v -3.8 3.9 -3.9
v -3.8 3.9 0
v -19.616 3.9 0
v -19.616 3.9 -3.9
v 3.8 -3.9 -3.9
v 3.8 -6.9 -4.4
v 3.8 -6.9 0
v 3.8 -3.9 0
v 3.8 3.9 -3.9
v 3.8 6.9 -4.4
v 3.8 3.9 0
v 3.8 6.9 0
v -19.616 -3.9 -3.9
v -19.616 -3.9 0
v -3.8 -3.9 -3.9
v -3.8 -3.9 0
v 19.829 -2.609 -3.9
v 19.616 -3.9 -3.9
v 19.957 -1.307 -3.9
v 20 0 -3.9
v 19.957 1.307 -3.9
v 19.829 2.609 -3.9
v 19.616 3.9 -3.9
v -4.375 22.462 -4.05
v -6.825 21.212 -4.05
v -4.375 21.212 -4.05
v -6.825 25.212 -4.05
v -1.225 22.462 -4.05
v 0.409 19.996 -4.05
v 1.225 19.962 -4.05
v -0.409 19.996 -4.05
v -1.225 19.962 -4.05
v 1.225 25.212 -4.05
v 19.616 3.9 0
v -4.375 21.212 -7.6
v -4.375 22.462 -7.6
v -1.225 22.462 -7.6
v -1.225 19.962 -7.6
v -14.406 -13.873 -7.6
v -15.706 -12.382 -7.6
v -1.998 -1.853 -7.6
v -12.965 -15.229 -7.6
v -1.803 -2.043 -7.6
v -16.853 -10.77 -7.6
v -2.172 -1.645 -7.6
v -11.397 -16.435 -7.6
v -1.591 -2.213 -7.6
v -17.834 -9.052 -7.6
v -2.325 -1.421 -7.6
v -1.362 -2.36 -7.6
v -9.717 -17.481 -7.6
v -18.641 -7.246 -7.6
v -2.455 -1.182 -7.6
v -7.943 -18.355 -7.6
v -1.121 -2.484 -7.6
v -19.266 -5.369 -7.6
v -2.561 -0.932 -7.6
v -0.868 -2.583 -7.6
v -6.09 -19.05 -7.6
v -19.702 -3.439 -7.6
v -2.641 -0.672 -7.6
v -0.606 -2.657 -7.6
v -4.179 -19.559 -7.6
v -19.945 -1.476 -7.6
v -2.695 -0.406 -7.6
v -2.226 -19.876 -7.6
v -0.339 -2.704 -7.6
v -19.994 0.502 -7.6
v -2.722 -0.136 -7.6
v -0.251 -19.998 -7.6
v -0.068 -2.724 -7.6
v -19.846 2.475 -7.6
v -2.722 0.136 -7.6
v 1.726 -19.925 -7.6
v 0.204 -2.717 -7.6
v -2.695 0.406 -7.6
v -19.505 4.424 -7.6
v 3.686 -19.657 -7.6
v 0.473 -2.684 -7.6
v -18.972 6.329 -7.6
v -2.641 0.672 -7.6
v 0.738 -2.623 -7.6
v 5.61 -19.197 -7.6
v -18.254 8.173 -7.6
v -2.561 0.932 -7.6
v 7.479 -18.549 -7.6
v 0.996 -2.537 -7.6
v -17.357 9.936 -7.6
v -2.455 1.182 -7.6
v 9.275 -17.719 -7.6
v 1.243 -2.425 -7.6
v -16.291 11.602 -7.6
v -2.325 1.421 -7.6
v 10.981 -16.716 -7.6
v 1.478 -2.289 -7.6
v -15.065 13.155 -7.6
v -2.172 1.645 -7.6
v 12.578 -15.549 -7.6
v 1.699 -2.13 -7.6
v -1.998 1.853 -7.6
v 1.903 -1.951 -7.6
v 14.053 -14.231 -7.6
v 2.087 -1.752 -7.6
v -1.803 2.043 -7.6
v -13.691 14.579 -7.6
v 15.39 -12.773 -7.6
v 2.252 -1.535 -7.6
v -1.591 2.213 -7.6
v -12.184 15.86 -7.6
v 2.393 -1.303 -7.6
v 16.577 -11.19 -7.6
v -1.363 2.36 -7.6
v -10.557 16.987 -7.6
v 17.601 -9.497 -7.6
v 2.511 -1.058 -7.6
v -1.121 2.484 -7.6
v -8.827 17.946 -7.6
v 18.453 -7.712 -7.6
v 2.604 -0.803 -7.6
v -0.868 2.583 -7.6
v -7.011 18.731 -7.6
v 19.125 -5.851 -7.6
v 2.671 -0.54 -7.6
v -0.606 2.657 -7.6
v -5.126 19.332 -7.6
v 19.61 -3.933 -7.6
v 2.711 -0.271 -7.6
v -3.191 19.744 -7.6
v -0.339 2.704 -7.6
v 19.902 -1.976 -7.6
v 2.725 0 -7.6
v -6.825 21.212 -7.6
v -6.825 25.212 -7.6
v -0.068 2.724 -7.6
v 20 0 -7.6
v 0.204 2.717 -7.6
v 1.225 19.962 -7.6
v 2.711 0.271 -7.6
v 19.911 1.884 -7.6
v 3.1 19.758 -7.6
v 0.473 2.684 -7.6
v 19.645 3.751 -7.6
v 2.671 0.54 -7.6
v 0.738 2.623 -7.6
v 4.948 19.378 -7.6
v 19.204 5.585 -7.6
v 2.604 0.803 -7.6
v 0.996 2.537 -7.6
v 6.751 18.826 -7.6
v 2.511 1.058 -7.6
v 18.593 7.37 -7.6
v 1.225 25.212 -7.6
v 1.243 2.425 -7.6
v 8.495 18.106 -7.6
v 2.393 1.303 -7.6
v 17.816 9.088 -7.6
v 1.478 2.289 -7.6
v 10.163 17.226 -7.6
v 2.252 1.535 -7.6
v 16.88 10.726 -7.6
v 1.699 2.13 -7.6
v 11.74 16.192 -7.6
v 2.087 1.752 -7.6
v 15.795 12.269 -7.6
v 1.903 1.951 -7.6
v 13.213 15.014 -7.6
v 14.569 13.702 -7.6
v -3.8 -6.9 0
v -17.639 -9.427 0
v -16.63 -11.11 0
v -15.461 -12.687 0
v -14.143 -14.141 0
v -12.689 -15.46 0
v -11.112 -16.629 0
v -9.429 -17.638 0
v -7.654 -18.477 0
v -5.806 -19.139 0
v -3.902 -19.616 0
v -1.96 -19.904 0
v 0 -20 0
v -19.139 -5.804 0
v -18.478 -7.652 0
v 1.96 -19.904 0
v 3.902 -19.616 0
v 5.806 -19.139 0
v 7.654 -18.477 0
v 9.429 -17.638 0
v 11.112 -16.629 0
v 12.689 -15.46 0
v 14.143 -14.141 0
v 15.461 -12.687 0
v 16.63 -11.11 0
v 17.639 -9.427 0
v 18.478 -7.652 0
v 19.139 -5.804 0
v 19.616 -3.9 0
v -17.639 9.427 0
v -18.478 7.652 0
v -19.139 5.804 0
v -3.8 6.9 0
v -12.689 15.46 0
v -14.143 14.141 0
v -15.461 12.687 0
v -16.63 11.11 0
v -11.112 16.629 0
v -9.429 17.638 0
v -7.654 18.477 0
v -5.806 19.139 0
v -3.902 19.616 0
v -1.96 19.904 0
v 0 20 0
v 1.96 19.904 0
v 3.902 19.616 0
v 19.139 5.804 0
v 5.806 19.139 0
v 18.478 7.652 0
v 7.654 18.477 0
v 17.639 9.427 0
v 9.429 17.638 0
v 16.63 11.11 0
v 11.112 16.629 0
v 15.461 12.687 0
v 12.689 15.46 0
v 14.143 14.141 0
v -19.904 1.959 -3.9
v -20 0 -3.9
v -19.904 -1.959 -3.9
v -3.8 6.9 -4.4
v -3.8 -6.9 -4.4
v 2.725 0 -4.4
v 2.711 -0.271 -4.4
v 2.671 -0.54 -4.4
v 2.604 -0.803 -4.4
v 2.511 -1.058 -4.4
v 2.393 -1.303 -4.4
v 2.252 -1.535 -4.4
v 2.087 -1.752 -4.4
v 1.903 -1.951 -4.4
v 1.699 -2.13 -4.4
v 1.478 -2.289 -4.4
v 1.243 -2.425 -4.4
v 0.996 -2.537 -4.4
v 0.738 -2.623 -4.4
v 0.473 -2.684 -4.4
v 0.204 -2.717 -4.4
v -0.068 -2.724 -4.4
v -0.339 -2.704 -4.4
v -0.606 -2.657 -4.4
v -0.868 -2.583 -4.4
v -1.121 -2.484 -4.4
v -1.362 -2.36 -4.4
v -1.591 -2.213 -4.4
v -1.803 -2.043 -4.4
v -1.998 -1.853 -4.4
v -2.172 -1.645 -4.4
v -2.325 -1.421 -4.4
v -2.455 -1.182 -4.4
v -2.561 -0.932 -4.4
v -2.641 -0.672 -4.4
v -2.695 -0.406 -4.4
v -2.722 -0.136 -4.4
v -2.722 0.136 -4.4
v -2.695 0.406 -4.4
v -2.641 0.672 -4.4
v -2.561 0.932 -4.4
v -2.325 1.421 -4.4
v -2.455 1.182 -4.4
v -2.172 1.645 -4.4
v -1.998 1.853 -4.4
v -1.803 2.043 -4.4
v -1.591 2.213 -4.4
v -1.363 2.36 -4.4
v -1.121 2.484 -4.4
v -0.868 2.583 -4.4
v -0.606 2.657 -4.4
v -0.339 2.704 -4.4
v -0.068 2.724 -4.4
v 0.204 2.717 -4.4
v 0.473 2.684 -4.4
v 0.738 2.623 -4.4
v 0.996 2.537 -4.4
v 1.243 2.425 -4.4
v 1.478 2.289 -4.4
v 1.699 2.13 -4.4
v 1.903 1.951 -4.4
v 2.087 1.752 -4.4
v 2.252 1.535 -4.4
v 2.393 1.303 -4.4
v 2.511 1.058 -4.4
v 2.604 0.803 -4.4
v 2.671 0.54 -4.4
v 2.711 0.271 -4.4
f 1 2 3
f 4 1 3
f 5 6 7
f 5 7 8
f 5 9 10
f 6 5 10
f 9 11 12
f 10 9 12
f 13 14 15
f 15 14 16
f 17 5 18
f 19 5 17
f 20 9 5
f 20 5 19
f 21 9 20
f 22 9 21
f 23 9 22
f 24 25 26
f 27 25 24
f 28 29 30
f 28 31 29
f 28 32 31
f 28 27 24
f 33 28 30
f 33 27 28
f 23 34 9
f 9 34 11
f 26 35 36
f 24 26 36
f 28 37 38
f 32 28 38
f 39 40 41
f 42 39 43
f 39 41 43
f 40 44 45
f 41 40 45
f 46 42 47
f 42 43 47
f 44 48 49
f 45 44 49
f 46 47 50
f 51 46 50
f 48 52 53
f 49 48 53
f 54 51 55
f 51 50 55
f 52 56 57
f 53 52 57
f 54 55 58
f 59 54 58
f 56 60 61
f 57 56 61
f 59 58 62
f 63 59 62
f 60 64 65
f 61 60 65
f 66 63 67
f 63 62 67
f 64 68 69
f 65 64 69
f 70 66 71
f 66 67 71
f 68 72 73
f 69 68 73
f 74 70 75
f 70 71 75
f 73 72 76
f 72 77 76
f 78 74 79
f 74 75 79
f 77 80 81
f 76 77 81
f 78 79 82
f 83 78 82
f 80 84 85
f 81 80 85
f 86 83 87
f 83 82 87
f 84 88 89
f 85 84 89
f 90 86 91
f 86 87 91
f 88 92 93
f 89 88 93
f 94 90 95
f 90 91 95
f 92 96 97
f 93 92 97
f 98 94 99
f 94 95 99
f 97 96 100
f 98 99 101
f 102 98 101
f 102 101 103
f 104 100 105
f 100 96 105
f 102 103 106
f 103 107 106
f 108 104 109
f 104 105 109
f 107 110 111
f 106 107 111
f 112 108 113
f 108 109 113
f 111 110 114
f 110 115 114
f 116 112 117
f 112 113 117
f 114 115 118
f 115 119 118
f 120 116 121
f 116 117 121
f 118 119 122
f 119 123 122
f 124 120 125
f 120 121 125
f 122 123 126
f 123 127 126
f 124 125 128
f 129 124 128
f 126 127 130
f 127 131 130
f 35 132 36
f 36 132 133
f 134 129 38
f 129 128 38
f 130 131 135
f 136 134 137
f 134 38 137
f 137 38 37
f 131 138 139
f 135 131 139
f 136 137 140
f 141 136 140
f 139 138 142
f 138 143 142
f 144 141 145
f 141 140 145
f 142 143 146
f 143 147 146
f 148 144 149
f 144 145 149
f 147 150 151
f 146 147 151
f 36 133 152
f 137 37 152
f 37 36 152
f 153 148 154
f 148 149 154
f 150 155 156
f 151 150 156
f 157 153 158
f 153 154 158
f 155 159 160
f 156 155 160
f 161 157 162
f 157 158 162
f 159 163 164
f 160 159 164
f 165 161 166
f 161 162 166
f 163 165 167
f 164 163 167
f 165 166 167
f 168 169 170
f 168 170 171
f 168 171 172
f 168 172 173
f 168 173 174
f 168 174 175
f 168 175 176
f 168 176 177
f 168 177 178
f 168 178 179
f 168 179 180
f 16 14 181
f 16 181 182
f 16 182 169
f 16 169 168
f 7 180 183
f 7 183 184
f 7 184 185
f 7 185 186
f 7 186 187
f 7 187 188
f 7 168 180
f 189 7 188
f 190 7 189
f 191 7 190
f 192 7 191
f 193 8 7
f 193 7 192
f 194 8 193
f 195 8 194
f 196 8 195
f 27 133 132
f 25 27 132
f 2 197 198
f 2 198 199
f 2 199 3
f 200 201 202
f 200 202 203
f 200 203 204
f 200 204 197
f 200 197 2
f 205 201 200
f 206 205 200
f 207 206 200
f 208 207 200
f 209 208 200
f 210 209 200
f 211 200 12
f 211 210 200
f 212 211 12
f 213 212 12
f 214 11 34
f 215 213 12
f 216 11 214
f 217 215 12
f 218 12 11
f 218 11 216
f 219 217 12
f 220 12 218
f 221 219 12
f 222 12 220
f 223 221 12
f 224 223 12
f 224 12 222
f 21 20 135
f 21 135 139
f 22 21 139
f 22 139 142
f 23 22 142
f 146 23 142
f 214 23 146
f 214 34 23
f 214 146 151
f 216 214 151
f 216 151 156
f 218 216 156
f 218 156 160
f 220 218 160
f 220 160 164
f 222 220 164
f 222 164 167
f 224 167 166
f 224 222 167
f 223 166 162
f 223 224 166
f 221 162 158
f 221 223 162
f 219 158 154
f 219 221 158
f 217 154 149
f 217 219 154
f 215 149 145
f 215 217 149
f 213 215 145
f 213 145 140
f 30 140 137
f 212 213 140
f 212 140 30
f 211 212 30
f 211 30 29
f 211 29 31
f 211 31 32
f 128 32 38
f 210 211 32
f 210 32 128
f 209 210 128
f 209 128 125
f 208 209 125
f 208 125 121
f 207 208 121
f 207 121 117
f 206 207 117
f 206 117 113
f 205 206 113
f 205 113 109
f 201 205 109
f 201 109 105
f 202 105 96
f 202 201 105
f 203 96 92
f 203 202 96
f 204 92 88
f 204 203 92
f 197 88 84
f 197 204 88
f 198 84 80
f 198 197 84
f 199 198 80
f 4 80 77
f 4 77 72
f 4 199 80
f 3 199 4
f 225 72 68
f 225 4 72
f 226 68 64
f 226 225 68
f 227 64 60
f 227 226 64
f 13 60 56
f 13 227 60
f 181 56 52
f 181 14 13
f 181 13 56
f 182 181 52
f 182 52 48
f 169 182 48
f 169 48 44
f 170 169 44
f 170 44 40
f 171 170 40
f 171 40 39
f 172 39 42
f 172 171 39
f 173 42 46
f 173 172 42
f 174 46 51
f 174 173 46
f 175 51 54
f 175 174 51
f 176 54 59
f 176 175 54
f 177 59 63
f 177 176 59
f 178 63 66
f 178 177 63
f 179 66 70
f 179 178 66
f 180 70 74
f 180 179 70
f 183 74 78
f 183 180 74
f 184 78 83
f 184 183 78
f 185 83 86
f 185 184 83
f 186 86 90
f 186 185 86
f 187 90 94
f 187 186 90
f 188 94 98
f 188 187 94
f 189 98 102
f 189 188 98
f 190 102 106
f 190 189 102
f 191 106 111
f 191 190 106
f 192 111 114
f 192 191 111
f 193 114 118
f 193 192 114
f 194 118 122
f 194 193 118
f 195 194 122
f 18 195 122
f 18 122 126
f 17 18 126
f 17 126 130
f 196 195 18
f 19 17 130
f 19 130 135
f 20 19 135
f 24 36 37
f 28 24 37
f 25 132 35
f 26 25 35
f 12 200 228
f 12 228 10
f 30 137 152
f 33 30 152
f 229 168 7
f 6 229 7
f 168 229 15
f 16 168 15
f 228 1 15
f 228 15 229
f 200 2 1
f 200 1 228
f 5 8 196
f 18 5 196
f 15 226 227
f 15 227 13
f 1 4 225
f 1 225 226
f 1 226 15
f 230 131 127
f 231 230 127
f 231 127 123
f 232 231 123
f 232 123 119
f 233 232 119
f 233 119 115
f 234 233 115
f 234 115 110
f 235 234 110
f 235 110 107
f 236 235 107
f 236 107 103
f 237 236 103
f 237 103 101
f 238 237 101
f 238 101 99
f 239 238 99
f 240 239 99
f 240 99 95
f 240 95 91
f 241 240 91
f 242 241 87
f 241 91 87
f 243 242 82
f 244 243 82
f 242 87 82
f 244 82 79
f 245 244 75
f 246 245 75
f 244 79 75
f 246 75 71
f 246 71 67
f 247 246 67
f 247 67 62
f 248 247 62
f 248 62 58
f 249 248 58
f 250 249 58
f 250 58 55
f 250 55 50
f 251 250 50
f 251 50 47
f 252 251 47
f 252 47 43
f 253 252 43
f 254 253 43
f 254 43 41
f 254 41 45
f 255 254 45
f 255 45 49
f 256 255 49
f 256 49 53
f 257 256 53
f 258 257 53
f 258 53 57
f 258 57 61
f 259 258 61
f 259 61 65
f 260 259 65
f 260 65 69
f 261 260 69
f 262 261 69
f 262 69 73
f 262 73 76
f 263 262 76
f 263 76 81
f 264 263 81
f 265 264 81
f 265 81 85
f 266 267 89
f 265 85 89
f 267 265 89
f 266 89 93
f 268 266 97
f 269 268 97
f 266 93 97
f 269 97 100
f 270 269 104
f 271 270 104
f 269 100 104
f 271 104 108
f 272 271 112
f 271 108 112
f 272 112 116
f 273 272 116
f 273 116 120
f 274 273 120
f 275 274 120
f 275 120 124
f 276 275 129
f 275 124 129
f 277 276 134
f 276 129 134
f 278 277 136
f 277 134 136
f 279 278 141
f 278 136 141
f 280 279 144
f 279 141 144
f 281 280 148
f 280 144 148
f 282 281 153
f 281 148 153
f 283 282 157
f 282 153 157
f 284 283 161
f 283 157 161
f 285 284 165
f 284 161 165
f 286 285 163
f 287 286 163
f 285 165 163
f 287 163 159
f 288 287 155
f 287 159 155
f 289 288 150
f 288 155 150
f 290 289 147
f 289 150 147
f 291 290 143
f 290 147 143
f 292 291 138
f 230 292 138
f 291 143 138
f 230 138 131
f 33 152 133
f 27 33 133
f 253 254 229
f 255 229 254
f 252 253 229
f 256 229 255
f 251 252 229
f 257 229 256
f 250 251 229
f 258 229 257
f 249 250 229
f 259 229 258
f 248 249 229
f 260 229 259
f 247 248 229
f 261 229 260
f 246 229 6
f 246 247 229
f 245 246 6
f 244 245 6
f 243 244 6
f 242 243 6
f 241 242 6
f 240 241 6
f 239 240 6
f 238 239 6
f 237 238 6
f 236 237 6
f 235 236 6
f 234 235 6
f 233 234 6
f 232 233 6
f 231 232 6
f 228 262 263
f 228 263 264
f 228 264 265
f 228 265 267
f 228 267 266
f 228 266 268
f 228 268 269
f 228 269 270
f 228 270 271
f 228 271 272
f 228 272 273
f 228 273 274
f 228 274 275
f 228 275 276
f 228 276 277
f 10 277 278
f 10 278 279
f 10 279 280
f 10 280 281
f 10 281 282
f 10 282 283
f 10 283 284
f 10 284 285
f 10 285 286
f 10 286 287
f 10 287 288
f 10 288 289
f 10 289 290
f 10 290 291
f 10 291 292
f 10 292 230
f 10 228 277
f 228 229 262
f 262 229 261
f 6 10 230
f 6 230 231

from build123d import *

# Parameters (mm, degrees)
F0_R      = 20
F1_DEPTH  = 7.6
F3_DEPTH  = 3.9
F4_W      = 7.6
F4_H      = 3
F5_W      = 7.6
F5_H      = 3
F6_DEPTH  = 4.4
F7_W      = 7.6
F7_H      = 7.8
F8_DEPTH  = 0.5
F11_DEPTH = 3.55
F12_R     = 2.725
F13_DEPTH = 7.6


with BuildPart() as f1:
    # F0 (on Top) → F1 (new body)
    with BuildSketch(Plane.XY):
        Circle(F0_R)
    extrude(amount=-F1_DEPTH)

    # F2 (on face) → F3 (cut)
    with BuildSketch(Plane.XY):
        with BuildLine():
            Line((19.6160648449, 3.9), (-19.6160648449, 3.9))
            ThreePointArc((-19.6160648449, 3.9), (-20, 0), (-19.6160648449, -3.9))
            Line((-19.6160648449, -3.9), (19.6160648449, -3.9))
            ThreePointArc((19.6160648449, -3.9), (19.903784777, -1.9594263321), (20, 0))
            ThreePointArc((20, 0), (19.903784777, 1.9594263321), (19.6160648449, 3.9))
        make_face()
    extrude(amount=-F3_DEPTH, mode=Mode.SUBTRACT)

    # F4 (on face) + F5 (on face) → F6 (cut)
    with BuildSketch(Plane.XY):
        with Locations((0, -5.4)):
            Rectangle(F4_W, F4_H)
    with BuildSketch(Plane.XY):
        with Locations((0, 5.4)):
            Rectangle(F5_W, F5_H)
    extrude(amount=-F6_DEPTH, mode=Mode.SUBTRACT)

    # F7 (on face) → F8 (cut)
    with BuildSketch(Plane.XY.offset(-3.9)):
        Rectangle(F7_W, F7_H)
    extrude(amount=-F8_DEPTH, mode=Mode.SUBTRACT)

    # F10 (on offset) → F11 (join)
    with BuildSketch(Plane.XY.offset(-7.6)):
        Polygon((1.225, 19.8352728039), (1.225, 19.9624491233), (1.225, 25.2124491233), (-6.825, 25.2124491233), (-6.825, 21.2124491233), (-4.375, 21.2124491233), (-4.375, 22.4624491233), (-1.225, 22.4624491233), (-1.225, 19.9624491233), (-1.225, 19.7902154177), align=None)
    extrude(amount=F11_DEPTH)

    # F12 (on face) → F13 (cut)
    with BuildSketch(Plane(origin=(0, 0, -7.6), x_dir=(1, 0, 0), z_dir=(0, 0, -1))):
        Circle(F12_R)
    extrude(amount=-F13_DEPTH, mode=Mode.SUBTRACT)


solid = f1.part
